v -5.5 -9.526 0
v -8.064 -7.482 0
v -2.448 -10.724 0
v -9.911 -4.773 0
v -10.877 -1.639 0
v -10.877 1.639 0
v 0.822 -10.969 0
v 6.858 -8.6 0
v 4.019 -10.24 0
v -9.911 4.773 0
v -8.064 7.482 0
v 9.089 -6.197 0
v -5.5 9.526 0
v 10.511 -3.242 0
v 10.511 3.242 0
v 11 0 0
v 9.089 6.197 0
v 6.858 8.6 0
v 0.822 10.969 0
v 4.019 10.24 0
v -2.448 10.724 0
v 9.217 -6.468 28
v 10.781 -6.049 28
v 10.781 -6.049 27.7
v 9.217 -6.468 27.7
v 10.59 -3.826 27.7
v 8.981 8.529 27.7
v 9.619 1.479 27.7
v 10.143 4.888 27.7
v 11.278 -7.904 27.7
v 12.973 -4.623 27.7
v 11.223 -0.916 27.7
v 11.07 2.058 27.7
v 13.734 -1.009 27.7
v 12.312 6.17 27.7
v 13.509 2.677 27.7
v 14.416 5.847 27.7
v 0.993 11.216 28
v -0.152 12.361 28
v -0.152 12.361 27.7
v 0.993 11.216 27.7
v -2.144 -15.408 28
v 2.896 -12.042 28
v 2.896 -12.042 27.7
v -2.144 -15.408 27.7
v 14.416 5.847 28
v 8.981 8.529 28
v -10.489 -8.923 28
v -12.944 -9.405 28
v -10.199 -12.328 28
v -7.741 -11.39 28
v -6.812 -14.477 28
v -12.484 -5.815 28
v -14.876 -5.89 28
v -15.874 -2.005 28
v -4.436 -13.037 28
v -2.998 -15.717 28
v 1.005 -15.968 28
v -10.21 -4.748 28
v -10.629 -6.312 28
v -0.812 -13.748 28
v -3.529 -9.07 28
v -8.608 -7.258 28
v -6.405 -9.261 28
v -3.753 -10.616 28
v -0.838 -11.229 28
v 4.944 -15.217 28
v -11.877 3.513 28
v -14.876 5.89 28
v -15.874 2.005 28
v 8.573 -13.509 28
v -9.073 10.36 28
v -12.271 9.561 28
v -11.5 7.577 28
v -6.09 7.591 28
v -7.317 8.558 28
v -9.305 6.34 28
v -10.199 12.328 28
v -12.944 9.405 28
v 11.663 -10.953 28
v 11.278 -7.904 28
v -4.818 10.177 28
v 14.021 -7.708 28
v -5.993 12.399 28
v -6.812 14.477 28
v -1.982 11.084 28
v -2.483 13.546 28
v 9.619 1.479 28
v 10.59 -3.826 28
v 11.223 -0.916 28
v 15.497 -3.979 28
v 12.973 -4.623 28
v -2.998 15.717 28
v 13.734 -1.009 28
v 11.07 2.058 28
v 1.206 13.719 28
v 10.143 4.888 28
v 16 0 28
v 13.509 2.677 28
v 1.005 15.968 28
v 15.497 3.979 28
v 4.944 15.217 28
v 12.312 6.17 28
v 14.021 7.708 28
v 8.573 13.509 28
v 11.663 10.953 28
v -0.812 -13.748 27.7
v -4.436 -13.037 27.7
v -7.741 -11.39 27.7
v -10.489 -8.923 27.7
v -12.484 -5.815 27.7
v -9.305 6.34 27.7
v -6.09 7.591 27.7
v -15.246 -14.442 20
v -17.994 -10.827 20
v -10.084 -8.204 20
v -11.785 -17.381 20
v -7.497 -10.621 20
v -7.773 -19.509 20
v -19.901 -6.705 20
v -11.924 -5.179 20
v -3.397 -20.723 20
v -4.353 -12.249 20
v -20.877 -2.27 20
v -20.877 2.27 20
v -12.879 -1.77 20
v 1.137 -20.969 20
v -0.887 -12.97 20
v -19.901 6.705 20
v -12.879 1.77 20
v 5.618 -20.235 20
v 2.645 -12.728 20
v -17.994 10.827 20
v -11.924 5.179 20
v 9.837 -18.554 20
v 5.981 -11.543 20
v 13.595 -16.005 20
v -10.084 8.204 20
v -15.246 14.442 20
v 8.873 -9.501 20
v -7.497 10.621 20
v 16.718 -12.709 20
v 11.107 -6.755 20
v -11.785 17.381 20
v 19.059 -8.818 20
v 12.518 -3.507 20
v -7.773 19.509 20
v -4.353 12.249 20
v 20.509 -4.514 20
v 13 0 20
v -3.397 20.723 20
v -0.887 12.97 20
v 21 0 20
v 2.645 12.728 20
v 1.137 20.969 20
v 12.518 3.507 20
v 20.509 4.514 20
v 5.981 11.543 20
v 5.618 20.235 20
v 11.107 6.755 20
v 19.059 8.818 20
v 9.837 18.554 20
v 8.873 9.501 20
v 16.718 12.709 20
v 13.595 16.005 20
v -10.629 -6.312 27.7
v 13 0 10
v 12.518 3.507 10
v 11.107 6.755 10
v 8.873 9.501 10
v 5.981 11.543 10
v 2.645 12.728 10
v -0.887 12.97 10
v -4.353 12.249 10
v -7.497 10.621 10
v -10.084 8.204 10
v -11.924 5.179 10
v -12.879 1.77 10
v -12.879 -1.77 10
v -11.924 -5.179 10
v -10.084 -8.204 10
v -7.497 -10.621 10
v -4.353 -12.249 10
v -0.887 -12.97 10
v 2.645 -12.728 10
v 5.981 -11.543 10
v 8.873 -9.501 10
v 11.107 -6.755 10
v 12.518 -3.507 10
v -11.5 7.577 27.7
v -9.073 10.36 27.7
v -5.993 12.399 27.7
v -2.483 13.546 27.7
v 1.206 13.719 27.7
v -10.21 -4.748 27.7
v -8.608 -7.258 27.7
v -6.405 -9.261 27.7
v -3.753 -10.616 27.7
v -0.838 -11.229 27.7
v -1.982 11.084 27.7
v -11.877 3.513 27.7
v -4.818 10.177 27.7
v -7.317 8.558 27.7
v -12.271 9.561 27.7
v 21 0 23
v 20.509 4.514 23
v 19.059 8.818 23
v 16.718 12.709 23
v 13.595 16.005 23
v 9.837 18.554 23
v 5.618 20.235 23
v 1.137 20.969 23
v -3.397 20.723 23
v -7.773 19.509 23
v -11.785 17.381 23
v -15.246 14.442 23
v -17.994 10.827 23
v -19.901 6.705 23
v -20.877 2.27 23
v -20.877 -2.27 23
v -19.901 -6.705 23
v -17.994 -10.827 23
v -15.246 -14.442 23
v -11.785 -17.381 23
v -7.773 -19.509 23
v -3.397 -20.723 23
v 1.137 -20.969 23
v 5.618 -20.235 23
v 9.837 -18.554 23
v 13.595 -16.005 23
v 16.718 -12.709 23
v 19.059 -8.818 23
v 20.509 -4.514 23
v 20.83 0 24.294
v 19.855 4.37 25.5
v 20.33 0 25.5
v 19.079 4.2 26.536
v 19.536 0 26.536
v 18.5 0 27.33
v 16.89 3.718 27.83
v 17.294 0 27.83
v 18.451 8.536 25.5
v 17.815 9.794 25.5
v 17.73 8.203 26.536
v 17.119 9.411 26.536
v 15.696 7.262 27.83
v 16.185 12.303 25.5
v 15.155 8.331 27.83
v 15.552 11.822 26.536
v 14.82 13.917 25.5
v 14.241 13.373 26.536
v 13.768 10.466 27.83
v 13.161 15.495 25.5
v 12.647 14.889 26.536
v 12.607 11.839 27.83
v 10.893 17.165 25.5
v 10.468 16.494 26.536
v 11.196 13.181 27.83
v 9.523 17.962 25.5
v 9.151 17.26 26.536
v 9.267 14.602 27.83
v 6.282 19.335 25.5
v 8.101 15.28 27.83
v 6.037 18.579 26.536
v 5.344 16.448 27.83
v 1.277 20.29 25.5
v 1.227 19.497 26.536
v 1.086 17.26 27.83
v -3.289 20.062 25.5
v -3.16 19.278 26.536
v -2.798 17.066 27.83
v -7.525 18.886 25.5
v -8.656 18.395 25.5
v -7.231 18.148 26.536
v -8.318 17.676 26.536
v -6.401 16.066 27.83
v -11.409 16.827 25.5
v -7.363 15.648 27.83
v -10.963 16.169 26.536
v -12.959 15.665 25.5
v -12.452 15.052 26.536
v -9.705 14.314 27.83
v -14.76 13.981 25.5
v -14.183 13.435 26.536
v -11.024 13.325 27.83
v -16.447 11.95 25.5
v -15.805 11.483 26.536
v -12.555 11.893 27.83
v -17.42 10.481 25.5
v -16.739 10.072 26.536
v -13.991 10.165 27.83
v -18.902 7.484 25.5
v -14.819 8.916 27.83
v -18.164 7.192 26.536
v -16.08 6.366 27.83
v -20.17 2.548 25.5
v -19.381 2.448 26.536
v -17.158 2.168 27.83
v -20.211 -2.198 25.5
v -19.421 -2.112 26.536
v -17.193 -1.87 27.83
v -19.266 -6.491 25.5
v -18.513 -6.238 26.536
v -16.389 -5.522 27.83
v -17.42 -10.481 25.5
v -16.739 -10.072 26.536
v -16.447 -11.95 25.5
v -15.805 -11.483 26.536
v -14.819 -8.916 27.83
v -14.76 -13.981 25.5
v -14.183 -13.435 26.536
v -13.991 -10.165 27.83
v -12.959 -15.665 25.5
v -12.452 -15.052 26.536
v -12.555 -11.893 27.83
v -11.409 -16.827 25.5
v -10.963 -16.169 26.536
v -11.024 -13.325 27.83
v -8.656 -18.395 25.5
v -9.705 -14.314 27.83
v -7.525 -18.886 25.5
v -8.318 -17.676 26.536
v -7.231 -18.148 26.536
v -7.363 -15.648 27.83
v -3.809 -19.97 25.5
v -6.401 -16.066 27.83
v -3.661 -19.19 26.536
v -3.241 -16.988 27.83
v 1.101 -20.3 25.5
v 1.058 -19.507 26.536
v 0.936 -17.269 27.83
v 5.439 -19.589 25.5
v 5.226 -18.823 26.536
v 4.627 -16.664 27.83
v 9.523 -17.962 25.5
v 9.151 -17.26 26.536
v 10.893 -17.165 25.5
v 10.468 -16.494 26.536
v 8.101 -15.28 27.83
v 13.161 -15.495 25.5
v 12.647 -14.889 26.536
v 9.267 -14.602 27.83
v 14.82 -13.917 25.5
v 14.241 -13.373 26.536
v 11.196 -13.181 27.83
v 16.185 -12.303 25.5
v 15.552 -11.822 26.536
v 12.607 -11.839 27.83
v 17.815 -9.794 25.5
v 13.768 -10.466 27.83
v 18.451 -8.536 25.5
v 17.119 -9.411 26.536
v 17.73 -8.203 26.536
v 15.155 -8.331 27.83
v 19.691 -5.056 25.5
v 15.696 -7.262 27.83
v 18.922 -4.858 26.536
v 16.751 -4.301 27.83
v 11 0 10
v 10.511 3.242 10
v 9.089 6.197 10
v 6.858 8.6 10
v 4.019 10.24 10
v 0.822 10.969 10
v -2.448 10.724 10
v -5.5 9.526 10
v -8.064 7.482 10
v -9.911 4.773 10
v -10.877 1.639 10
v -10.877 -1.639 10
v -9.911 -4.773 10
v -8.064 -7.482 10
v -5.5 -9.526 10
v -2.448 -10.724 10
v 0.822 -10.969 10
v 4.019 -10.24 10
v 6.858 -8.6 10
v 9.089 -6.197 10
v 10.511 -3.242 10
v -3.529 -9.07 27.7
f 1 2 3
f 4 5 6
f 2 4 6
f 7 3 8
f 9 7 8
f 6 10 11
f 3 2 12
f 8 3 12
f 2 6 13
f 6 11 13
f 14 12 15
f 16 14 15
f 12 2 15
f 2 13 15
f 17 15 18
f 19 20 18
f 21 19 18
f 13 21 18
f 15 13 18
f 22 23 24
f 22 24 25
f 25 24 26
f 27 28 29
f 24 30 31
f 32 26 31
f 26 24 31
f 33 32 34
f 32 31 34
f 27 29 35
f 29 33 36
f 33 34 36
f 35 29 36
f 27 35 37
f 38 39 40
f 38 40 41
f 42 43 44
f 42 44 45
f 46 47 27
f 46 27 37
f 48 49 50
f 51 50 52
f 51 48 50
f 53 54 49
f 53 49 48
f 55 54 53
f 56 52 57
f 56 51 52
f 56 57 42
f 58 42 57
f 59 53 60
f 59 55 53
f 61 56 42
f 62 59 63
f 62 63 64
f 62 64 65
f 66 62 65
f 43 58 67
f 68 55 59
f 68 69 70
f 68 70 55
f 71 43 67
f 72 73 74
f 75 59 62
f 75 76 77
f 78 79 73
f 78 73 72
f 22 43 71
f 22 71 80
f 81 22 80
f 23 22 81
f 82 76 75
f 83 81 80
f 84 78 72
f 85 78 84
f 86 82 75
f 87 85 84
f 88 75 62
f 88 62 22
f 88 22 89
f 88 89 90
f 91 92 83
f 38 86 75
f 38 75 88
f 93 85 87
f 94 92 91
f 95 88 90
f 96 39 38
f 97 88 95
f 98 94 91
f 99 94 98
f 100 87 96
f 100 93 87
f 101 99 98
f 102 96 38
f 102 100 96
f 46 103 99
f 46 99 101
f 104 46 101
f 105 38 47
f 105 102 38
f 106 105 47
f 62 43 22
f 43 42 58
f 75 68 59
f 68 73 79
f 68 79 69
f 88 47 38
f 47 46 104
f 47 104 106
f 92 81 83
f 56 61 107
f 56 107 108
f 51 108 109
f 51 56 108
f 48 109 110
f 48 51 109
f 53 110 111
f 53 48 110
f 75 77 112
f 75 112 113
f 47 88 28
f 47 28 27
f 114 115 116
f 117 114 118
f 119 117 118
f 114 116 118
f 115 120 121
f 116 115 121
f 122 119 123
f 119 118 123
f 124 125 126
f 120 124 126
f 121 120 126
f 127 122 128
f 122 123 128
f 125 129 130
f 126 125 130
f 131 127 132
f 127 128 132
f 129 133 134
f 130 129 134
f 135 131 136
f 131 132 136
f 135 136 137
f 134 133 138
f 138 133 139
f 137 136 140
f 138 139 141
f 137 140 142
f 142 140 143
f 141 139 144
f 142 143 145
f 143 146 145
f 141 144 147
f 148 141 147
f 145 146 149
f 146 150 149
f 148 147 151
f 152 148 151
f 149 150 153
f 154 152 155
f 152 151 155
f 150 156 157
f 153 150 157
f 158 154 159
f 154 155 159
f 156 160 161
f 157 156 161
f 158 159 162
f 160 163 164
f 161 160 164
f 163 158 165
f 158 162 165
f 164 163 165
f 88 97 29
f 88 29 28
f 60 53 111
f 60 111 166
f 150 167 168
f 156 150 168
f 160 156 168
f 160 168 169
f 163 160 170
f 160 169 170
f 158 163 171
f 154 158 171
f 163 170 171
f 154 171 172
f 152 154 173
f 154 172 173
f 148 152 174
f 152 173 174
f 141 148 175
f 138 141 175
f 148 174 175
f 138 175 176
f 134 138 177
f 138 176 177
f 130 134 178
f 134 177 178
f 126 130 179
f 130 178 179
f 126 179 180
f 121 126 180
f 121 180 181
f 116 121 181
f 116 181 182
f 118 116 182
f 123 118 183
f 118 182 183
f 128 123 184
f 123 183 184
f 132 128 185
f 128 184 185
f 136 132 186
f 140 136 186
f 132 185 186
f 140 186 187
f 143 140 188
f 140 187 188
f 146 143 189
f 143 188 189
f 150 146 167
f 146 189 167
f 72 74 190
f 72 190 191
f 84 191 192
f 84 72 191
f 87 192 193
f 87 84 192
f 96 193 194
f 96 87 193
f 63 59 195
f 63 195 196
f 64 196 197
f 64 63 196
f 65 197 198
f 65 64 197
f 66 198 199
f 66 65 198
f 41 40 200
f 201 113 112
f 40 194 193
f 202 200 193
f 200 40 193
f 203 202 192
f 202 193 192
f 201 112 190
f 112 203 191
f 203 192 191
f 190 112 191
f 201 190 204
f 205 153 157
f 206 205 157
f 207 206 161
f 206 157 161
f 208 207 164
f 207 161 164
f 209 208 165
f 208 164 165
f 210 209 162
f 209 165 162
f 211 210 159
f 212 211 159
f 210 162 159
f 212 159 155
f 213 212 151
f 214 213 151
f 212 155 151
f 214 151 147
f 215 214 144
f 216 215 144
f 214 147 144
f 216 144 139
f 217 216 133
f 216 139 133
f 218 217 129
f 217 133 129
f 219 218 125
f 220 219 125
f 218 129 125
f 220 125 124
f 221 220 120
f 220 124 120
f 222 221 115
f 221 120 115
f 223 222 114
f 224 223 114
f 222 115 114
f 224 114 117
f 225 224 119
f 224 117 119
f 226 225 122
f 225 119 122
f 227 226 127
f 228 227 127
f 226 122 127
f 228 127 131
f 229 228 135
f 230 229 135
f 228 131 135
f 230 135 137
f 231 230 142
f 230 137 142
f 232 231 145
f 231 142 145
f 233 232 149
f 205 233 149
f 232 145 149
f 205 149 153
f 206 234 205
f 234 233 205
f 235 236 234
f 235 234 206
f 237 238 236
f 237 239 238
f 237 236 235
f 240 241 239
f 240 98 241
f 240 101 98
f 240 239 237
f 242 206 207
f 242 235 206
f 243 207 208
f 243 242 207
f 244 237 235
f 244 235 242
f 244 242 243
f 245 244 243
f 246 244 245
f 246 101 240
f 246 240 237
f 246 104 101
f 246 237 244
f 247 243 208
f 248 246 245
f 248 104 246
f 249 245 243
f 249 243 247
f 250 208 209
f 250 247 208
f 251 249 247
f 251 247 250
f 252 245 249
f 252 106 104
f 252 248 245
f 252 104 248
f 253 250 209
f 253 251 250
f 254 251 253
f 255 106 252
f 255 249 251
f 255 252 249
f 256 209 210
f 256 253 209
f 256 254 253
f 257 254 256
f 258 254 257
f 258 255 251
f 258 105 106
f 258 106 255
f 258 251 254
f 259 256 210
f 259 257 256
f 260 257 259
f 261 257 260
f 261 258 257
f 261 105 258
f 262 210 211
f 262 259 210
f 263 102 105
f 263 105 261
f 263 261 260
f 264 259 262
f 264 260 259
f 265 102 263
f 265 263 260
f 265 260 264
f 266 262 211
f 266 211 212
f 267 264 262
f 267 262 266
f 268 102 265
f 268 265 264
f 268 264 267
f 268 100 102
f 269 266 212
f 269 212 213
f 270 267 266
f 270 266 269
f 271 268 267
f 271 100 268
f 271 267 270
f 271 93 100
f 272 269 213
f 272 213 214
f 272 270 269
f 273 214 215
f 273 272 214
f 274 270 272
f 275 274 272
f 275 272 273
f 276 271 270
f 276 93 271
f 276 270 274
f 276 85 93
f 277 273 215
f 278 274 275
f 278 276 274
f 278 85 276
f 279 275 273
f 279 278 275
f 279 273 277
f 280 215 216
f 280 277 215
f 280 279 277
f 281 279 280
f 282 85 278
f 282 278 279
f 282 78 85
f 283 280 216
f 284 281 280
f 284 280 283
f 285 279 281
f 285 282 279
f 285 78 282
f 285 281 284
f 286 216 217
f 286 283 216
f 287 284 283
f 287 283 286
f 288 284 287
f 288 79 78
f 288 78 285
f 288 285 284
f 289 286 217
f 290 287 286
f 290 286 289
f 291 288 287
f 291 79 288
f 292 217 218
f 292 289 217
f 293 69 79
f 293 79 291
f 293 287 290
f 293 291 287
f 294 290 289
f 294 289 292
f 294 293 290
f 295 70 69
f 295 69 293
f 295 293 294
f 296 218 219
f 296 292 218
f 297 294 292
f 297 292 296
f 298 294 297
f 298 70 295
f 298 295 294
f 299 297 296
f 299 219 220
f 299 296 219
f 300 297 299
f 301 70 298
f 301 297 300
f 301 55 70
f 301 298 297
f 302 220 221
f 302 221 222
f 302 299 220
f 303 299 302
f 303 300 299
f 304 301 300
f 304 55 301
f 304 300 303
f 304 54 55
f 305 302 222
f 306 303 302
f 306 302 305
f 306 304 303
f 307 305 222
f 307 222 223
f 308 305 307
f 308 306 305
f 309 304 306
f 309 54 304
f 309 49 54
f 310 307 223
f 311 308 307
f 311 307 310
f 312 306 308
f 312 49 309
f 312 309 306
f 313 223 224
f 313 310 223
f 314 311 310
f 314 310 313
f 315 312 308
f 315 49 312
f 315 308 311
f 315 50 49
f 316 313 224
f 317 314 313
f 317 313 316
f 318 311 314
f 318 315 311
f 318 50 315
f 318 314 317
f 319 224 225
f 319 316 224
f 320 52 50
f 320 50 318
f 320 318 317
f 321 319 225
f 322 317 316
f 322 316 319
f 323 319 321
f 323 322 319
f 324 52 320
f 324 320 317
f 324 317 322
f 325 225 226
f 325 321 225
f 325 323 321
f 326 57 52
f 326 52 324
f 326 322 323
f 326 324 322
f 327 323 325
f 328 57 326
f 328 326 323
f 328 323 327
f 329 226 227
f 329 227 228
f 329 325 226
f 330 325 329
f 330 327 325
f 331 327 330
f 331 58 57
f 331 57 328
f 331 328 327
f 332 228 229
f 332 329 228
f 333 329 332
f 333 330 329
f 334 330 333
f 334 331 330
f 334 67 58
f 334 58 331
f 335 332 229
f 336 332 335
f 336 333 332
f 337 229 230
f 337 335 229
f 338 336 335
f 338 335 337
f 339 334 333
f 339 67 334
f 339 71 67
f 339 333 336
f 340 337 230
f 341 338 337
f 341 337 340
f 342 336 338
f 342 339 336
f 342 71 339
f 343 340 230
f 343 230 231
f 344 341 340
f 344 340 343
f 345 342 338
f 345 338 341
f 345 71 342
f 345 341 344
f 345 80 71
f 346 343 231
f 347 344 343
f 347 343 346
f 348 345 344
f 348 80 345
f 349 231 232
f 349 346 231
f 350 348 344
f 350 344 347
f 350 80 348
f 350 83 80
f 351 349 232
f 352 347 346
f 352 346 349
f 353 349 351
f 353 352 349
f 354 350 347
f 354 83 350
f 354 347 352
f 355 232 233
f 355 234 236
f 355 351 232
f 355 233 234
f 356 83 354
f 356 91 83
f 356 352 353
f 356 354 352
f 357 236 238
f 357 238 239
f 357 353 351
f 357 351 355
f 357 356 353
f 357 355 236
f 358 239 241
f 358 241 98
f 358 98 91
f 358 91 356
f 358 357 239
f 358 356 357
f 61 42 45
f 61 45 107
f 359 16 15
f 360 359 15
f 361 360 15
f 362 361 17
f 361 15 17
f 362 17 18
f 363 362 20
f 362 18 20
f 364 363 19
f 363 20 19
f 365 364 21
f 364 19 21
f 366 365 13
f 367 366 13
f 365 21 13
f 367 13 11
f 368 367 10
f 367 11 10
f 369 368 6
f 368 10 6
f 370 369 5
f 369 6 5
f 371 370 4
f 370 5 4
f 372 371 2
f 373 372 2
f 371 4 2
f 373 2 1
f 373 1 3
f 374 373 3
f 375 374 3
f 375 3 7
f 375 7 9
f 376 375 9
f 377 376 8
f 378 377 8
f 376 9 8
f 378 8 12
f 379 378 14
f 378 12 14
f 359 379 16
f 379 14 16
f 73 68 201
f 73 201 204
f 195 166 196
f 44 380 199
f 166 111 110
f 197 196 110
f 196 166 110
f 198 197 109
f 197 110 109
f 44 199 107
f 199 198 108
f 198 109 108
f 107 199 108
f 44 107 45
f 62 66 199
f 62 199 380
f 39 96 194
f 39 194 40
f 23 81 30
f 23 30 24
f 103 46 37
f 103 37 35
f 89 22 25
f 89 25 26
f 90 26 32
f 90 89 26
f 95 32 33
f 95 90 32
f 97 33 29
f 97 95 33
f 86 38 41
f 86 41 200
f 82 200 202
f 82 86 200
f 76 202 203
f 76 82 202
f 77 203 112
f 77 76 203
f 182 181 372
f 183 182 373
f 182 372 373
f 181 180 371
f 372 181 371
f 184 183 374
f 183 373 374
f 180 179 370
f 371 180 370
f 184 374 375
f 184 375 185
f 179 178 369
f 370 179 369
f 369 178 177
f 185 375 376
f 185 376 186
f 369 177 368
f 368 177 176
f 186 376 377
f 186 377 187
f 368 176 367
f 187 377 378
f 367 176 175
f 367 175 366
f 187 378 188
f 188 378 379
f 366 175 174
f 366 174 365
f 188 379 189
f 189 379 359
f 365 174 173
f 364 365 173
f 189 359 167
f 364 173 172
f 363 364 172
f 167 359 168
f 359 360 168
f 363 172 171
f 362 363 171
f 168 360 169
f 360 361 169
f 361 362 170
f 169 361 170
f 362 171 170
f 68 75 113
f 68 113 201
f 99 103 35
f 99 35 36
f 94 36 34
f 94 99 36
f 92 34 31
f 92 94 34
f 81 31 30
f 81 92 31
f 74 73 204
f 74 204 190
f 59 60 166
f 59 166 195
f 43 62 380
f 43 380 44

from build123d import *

# Parameters (mm, degrees)
SKETCH_1_R               = 11
EXTRUDE_1_DEPTH          = 10
SKETCH_2_R               = 13
EXTRUDE_2_DEPTH          = 10
SKETCH_6_R               = 21
EXTRUDE_5_DEPTH          = 8
FILLET_4_R               = 5
CUT_EXTRUDE_3_DEPTH      = 0.3
PATTERN_CIRCULAR_1_COUNT = 3


with BuildPart() as part:
    # 草图1 → 凸台-拉伸1 (new body)
    with BuildSketch(Plane.XY):
        Circle(SKETCH_1_R)
    extrude(amount=EXTRUDE_1_DEPTH)

    # 草图2 → 凸台-拉伸2 (add)
    with BuildSketch(Plane.XY.offset(10)):
        Circle(SKETCH_2_R)
    extrude(amount=EXTRUDE_2_DEPTH)

    # 草图6 → 凸台-拉伸5 (add)
    with BuildSketch(Plane.XY.offset(20)):
        Circle(SKETCH_6_R)
    extrude(amount=EXTRUDE_5_DEPTH)

    # 圆角4
    fillet_4_edges = [part.edges().sort_by_distance(p)[0] for p in [
        (-21, 0, 28),
    ]]
    fillet(fillet_4_edges, radius=FILLET_4_R)

    # 草图7 → 切除-拉伸3 (cut)
    with BuildSketch(Plane.XY.offset(28)):
        with BuildLine():
            Line((-9.304992191, 6.340429284), (-6.090228266, 7.590754313))
            Line((-6.090228266, 7.590754313), (-11.877072904, 3.512738797))
            Line((-11.877072904, 3.512738797), (-12.271255314, 9.560904356))
            Line((-12.271255314, 9.560904356), (-11.499666165, 7.577038638))
            ThreePointArc((-11.499666165, 7.577038638), (-5.993368065, 12.398926391), (1.205826183, 13.718593938))
            Line((1.205826183, 13.718593938), (-0.151715423, 12.361052332))
            Line((-0.151715423, 12.361052332), (0.993407881, 11.215929028))
            ThreePointArc((0.993407881, 11.215929028), (-4.818011299, 10.176968621), (-9.304992191, 6.340429284))
        make_face()
    cut_extrude_3 = extrude(amount=-CUT_EXTRUDE_3_DEPTH, mode=Mode.SUBTRACT)

    # 阵列(圆周)1: 切除-拉伸3 ×3 about axis
    pattern_circular_1_axis = Axis((0, 0, 20), (0, 0, -1))
    for i in range(1, PATTERN_CIRCULAR_1_COUNT):
        add(cut_extrude_3.rotate(pattern_circular_1_axis, i * 360 / PATTERN_CIRCULAR_1_COUNT), mode=Mode.SUBTRACT)


solid = part.part
